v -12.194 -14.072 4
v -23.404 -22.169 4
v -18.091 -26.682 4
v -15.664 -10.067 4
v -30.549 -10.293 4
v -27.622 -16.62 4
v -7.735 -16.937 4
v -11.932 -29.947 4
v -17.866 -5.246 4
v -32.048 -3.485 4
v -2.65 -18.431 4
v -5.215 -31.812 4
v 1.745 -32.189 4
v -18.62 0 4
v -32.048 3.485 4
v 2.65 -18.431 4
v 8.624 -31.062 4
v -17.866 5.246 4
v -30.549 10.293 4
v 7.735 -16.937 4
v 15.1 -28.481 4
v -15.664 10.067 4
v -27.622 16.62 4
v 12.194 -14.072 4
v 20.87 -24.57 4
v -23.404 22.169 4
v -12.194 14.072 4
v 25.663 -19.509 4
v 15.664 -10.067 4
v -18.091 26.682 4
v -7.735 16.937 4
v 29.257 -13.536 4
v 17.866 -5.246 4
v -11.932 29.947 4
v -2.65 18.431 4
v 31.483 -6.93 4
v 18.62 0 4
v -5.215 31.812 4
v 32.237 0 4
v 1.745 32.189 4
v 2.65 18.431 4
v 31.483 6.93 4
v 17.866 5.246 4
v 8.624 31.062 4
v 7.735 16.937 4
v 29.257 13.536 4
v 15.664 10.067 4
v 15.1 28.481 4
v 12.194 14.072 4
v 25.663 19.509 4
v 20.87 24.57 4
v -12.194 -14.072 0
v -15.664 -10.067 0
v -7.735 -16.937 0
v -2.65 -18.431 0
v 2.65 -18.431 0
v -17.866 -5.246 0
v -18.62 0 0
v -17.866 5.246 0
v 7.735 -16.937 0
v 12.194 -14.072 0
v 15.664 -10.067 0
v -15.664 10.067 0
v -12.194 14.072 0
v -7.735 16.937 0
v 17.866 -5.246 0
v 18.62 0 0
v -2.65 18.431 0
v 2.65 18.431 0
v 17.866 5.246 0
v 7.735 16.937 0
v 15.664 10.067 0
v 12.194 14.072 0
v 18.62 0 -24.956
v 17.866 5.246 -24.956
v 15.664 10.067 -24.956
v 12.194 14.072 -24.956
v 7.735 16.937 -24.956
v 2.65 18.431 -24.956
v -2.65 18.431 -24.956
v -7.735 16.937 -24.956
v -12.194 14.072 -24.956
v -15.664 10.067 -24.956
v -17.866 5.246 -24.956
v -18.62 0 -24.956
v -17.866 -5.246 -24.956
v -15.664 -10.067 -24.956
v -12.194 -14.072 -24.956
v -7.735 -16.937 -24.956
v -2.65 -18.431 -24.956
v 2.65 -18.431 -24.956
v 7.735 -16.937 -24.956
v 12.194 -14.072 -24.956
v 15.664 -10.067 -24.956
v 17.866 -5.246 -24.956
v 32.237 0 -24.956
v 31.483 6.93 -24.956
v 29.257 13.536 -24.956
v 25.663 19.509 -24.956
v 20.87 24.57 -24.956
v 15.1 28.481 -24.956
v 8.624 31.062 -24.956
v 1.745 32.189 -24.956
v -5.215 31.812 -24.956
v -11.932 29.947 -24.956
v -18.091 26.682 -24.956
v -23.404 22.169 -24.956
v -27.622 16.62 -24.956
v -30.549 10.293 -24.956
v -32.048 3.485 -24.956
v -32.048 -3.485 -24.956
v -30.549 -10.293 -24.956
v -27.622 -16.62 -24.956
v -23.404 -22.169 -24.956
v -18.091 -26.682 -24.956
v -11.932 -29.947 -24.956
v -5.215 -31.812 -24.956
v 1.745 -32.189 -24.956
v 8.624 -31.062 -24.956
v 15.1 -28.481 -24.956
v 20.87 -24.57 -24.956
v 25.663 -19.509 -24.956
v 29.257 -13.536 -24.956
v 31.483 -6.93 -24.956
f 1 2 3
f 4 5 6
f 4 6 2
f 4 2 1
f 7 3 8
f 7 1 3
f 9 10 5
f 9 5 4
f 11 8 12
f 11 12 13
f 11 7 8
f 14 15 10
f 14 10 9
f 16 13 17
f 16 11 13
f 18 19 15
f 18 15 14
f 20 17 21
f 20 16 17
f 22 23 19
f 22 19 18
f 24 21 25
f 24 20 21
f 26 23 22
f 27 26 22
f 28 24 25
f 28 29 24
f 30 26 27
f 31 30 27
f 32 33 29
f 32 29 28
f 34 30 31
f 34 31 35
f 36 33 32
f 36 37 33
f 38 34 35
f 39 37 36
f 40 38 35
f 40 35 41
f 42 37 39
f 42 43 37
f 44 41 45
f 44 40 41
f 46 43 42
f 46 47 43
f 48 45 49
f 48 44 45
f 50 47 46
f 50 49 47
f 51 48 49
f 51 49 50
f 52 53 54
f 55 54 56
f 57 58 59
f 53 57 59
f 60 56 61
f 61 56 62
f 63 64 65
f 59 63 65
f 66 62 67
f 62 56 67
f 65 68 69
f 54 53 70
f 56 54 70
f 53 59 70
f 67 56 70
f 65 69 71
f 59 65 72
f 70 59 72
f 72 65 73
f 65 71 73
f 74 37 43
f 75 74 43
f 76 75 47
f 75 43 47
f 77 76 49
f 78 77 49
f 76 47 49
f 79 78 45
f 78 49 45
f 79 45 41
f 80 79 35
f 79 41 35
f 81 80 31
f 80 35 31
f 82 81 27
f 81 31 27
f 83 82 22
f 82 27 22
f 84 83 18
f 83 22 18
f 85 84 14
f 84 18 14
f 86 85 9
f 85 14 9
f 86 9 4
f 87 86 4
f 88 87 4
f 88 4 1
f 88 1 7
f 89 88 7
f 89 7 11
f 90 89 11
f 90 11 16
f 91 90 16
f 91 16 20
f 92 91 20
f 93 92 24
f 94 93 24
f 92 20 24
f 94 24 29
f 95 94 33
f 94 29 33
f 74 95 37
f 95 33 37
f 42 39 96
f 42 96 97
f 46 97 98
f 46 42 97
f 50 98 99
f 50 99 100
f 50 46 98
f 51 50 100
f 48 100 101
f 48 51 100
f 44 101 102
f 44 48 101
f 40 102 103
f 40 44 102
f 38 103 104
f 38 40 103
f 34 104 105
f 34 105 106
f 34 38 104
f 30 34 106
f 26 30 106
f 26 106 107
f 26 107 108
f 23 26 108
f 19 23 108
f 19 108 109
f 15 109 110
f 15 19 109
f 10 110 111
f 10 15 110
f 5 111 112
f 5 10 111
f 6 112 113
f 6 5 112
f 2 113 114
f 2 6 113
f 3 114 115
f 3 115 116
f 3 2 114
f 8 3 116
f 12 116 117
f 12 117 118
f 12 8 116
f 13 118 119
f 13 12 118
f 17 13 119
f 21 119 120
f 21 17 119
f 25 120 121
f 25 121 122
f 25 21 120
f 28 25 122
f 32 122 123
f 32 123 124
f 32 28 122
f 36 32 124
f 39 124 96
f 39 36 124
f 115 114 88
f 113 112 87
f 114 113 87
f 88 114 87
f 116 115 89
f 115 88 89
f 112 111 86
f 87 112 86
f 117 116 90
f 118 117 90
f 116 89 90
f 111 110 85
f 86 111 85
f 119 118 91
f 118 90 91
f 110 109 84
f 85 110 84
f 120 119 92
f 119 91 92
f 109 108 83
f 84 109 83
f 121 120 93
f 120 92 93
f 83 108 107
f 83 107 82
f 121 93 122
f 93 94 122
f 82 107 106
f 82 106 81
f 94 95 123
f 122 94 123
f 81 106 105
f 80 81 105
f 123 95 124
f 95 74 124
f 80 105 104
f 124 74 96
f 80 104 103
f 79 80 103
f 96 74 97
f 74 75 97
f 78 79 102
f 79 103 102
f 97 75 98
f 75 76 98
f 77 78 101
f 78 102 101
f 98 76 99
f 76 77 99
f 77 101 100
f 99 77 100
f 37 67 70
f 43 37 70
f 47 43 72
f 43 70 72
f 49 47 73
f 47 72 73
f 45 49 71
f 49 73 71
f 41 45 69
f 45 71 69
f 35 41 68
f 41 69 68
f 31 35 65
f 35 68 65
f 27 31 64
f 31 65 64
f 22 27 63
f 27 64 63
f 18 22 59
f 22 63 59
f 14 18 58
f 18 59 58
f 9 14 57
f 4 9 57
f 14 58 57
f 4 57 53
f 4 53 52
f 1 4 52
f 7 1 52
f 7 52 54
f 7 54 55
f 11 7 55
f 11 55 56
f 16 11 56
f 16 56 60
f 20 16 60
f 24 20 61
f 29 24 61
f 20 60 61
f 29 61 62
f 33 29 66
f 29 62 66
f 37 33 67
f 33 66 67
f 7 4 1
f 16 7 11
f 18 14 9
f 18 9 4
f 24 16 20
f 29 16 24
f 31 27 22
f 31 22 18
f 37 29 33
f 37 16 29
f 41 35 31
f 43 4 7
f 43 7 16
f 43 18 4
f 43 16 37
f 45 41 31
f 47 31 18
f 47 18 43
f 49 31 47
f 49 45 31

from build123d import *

# Parameters (mm, degrees)
F0_R     = 18.620055
F1_DEPTH = 4
F2_R     = 32.236619
F2_R_2   = 18.620055
F3_DEPTH = 28.956


with BuildPart() as f1:
    # F0 (on Top) → F1 (new body)
    with BuildSketch(Plane.XY):
        Circle(F0_R)
    extrude(amount=F1_DEPTH)


with BuildPart() as f3:
    # F2 (on face) → F3 (new body)
    with BuildSketch(Plane.XY.offset(4)):
        Circle(F2_R)
        Circle(F2_R_2, mode=Mode.SUBTRACT)
    extrude(amount=-F3_DEPTH)


solid = Compound([f1.part, f3.part])
